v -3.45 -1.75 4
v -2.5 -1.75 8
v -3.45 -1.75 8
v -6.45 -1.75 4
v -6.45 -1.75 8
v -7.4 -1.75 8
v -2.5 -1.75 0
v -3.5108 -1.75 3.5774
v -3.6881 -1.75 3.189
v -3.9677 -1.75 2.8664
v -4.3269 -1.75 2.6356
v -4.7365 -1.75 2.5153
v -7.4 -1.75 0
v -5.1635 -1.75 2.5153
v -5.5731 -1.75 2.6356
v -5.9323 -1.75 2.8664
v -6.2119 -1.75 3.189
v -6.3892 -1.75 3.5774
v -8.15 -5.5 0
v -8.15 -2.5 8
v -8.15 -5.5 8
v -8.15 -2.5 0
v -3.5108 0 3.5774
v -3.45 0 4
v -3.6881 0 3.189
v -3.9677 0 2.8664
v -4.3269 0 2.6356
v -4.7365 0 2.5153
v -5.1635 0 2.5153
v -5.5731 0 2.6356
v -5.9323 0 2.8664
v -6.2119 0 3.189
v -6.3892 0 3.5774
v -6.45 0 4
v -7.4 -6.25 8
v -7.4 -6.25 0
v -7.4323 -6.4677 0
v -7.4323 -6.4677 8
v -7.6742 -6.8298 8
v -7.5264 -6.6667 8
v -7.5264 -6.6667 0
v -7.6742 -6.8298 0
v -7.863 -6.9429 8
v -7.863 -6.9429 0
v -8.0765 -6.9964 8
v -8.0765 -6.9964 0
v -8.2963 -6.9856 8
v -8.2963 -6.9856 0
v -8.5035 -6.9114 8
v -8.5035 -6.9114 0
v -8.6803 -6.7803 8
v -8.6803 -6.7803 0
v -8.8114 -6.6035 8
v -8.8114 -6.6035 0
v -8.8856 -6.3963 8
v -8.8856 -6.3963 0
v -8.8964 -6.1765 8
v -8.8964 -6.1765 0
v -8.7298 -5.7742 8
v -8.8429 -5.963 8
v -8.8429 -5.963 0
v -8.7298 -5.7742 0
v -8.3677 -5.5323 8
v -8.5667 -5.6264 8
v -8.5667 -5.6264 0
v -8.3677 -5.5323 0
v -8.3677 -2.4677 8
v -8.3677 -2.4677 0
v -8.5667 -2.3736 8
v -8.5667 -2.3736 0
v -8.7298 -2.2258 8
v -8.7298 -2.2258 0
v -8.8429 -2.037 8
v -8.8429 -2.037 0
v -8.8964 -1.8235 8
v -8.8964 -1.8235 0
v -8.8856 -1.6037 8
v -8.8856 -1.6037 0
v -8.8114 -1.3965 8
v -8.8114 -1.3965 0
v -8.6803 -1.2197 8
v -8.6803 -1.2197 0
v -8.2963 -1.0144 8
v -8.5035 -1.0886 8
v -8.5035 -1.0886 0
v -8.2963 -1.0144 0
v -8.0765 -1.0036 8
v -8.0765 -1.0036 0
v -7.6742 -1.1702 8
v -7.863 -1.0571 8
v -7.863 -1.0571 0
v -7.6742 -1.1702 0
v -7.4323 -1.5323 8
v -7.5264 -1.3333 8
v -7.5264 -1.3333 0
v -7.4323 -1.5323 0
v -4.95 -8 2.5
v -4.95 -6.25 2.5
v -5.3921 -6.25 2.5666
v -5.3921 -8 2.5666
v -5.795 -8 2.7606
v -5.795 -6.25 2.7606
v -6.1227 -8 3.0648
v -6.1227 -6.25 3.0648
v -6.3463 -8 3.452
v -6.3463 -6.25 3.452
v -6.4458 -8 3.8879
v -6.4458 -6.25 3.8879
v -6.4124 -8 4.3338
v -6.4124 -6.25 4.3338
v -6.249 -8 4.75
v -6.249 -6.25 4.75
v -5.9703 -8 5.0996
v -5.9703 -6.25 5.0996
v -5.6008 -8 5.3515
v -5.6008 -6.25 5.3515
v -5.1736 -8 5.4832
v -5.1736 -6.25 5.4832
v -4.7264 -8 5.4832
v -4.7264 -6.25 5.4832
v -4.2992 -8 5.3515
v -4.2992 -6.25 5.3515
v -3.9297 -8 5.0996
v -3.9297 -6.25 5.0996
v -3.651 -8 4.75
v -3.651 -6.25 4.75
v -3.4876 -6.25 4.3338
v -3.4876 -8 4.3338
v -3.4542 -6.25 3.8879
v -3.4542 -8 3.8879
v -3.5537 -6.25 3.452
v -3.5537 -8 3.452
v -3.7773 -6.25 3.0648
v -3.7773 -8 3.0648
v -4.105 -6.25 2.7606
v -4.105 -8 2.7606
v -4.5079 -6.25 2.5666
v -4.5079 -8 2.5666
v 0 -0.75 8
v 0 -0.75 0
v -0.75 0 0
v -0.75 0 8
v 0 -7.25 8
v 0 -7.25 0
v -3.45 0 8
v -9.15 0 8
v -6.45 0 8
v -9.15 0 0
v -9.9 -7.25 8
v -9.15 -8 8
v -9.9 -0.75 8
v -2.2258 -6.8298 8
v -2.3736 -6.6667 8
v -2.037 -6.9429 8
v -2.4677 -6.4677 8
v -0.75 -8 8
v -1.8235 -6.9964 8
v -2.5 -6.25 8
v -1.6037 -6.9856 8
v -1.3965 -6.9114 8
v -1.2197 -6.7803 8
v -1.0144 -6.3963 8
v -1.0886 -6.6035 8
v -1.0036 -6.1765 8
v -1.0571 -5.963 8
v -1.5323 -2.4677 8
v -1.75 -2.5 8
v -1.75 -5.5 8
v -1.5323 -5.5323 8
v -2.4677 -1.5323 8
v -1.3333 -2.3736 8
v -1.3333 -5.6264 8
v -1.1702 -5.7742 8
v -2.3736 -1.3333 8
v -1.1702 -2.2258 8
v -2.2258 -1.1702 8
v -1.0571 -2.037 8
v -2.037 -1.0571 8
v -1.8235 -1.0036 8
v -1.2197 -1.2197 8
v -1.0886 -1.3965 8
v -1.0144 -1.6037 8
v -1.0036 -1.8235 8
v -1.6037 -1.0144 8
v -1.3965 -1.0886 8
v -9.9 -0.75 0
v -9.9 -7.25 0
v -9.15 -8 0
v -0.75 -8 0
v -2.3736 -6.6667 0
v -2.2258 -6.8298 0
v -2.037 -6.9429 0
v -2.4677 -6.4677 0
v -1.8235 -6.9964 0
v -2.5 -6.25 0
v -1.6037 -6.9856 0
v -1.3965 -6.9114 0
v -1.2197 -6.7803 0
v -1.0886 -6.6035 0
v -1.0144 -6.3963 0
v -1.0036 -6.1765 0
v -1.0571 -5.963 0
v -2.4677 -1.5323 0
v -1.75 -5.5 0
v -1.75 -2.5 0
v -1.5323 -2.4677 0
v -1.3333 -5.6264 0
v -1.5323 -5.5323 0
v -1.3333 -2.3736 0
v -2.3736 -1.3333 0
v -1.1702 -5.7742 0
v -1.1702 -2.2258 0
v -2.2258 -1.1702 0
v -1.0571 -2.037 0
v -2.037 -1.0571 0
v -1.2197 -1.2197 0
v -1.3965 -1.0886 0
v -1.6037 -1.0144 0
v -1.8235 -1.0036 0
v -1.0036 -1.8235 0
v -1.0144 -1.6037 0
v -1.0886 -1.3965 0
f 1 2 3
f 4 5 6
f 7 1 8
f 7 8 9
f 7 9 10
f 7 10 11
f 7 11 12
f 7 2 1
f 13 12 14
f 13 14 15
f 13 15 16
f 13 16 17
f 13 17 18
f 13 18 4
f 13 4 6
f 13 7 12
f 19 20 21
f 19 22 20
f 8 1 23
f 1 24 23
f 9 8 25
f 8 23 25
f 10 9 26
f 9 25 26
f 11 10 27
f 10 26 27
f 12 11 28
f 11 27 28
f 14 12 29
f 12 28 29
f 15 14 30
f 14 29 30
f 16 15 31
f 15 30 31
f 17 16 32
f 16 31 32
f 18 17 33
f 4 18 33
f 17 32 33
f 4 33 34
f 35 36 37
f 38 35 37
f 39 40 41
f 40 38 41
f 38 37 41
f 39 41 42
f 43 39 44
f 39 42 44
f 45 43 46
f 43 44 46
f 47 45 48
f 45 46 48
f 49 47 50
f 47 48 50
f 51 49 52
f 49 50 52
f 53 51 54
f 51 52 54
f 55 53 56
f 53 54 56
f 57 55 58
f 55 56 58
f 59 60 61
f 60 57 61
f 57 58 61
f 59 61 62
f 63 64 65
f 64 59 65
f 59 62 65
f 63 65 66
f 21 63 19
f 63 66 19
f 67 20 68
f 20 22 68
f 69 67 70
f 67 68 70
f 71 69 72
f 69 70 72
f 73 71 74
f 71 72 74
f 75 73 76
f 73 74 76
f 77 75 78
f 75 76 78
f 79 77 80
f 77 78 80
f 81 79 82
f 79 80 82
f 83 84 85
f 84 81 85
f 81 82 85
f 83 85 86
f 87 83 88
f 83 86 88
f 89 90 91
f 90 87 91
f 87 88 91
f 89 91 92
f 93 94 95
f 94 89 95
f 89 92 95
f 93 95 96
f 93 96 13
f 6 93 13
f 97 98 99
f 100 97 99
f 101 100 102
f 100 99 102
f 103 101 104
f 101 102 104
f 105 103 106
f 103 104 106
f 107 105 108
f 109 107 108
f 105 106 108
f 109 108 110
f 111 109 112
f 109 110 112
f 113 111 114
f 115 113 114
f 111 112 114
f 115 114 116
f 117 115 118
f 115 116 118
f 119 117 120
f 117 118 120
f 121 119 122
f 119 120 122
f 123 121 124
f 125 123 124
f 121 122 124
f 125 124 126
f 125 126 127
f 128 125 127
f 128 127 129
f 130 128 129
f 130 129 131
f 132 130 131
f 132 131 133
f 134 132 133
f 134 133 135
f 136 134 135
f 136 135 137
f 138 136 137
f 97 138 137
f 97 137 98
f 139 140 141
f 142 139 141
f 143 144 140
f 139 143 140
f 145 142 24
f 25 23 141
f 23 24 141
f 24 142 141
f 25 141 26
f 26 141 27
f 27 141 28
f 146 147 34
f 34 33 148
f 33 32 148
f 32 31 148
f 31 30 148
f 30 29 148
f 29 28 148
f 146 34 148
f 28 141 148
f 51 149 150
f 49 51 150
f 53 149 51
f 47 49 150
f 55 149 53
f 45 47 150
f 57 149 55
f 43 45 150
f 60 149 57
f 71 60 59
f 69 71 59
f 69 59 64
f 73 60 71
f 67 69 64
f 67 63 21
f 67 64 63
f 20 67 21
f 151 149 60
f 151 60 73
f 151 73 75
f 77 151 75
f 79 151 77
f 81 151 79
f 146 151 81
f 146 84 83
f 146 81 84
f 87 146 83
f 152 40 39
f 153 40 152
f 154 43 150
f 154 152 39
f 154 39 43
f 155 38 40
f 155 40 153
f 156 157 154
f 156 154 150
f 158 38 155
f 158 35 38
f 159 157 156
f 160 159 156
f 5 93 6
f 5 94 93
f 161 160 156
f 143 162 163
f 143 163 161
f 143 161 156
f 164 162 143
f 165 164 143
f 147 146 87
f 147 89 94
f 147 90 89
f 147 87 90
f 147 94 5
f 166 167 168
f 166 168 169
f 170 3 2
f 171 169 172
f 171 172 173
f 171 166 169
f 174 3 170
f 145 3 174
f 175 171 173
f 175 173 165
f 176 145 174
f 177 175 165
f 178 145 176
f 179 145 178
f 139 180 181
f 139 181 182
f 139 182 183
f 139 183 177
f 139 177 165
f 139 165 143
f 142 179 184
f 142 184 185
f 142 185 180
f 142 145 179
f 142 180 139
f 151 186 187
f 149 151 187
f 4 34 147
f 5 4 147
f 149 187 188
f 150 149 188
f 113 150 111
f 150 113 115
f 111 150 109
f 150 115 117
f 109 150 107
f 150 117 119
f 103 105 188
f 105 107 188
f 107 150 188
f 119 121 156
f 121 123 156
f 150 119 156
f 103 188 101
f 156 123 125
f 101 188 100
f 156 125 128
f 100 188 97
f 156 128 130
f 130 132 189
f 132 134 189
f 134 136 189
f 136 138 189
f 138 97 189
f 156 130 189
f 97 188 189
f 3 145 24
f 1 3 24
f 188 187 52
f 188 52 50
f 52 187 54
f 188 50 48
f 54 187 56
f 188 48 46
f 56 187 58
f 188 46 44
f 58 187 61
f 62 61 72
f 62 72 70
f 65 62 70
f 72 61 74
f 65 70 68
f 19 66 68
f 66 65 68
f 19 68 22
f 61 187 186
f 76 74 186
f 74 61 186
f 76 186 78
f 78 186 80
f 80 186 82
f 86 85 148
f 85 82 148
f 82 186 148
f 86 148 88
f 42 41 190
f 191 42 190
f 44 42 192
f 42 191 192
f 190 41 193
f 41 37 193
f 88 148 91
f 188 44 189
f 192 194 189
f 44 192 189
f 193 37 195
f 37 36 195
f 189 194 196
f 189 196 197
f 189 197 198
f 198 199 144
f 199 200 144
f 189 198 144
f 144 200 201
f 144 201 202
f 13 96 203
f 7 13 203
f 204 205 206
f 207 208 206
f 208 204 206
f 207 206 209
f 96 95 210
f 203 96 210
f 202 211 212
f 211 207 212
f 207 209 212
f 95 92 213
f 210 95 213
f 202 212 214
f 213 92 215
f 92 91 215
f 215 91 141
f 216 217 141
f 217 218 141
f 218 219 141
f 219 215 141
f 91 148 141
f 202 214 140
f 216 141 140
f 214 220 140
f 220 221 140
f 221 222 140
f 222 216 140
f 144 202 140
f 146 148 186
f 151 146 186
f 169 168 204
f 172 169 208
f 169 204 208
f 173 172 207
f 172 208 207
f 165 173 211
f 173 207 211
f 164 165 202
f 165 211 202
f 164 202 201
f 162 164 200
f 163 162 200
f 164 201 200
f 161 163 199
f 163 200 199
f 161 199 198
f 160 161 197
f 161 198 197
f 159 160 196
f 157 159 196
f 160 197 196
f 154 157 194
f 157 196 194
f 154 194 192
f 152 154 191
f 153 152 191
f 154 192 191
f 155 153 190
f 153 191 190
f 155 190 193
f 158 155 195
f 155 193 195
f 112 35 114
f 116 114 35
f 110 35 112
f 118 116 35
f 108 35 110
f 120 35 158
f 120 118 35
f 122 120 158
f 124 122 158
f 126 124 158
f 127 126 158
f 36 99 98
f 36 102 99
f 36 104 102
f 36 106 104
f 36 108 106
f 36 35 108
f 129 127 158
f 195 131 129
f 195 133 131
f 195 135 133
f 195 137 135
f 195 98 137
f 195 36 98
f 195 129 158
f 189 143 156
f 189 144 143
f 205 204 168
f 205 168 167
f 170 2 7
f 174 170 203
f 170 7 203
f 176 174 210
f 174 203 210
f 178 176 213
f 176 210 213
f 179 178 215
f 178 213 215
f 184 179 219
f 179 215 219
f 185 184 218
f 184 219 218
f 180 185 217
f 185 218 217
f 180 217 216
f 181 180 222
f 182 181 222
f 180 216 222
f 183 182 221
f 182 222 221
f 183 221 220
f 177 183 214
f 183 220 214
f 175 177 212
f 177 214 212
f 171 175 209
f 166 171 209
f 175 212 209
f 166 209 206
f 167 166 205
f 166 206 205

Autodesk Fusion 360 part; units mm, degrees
sketch "Sketch1" plane through (0, 0, 0) normal (0, 0, 1) x (1, 0, 0) in component "Prusa Expansion Joint"
  line L0 (-9.15, -8) -> (-0.75, -8)
  line L1 (0, -7.25) -> (0, -0.75)
  line L2 (-0.75, 0) -> (-9.15, 0)
  line L3 (-9.9, -0.75) -> (-9.9, -7.25)
  line L4 (-8.15, -6.25) -> (-1.75, -6.25)
  line L5 (-1.75, -6.25) -> (-1.75, -1.75)
  line L6 (-1.75, -1.75) -> (-8.15, -1.75)
  line L7 (-8.15, -1.75) -> (-8.15, -6.25)
  circle A0 centre (-1.75, -1.75) radius 0.75
  circle A1 centre (-8.15, -6.25) radius 0.75
  circle A2 centre (-8.15, -1.75) radius 0.75
  circle A3 centre (-1.75, -6.25) radius 0.75
  line L8 (-9.15, 0) -> (-9.9, -0.75)
  line L9 (-9.9, -7.25) -> (-9.15, -8)
  line L10 (0, -7.25) -> (-0.75, -8)
  line L11 (0, -0.75) -> (-0.75, 0)
  line L12 (0, -0.75) -> (0, 0) construction
  line L13 (0, 0) -> (-0.75, 0) construction
  dimension "d4" = 1.5
  dimension "d5" = 1.5
  dimension "d6" = 1.5
  dimension "d7" = 1.5
  dimension "d15" = 1.75
  dimension "d16" = 1.75
  dimension "d17" = 1.75
  dimension "d18" = 1.75
  dimension "d26" = 135
  dimension "d27" = 135
  dimension "d30" = 8
  dimension "d31" = 9.9
  dimension "d32" = 0.75
extrude "Extrude1" add sketch "Sketch1" along normal blind 8 in component "Prusa Expansion Joint"
hole "Hole1" at (-4.95, -8, 4) direction (0, 1, 0) diameter 3 depth 8 tip angle 180 in component "Prusa Expansion Joint"
sketch "Sketch2" plane through (0, 0, 0) normal (0, 1, 0) x (1, 0, 0) in component "Prusa Expansion Joint"
  line L0 (-3.45, -4) -> (-6.45, -4)
  line L1 (-6.45, -4) -> (-6.45, -8)
  line L2 (-6.45, -8) -> (-3.45, -8)
  line L3 (-3.45, -8) -> (-3.45, -4)
  dimension "d33" = 3
  dimension "d34" = 4
  dimension "d35" = 4
  dimension "d36" = 3.45
extrude "Extrude2" cut sketch "Sketch2" against normal blind 1.75 in component "Prusa Expansion Joint"
component "Prusa Expansion Joint" placed x (1, 0, 0) y (0, 1, 0) z (0, 0, 1) at (0, 0, 0)
equation "d4 = ( 0.75 * 2 ) * 1 mm"
equation "d25 = ( 9.9 / 2 ) * 1 mm"
equation "d26 = 45 deg + 45 deg + 45 deg"
equation "d36 = ( ( 9.9 / 2 ) * 1 mm ) - 1.5 mm"
